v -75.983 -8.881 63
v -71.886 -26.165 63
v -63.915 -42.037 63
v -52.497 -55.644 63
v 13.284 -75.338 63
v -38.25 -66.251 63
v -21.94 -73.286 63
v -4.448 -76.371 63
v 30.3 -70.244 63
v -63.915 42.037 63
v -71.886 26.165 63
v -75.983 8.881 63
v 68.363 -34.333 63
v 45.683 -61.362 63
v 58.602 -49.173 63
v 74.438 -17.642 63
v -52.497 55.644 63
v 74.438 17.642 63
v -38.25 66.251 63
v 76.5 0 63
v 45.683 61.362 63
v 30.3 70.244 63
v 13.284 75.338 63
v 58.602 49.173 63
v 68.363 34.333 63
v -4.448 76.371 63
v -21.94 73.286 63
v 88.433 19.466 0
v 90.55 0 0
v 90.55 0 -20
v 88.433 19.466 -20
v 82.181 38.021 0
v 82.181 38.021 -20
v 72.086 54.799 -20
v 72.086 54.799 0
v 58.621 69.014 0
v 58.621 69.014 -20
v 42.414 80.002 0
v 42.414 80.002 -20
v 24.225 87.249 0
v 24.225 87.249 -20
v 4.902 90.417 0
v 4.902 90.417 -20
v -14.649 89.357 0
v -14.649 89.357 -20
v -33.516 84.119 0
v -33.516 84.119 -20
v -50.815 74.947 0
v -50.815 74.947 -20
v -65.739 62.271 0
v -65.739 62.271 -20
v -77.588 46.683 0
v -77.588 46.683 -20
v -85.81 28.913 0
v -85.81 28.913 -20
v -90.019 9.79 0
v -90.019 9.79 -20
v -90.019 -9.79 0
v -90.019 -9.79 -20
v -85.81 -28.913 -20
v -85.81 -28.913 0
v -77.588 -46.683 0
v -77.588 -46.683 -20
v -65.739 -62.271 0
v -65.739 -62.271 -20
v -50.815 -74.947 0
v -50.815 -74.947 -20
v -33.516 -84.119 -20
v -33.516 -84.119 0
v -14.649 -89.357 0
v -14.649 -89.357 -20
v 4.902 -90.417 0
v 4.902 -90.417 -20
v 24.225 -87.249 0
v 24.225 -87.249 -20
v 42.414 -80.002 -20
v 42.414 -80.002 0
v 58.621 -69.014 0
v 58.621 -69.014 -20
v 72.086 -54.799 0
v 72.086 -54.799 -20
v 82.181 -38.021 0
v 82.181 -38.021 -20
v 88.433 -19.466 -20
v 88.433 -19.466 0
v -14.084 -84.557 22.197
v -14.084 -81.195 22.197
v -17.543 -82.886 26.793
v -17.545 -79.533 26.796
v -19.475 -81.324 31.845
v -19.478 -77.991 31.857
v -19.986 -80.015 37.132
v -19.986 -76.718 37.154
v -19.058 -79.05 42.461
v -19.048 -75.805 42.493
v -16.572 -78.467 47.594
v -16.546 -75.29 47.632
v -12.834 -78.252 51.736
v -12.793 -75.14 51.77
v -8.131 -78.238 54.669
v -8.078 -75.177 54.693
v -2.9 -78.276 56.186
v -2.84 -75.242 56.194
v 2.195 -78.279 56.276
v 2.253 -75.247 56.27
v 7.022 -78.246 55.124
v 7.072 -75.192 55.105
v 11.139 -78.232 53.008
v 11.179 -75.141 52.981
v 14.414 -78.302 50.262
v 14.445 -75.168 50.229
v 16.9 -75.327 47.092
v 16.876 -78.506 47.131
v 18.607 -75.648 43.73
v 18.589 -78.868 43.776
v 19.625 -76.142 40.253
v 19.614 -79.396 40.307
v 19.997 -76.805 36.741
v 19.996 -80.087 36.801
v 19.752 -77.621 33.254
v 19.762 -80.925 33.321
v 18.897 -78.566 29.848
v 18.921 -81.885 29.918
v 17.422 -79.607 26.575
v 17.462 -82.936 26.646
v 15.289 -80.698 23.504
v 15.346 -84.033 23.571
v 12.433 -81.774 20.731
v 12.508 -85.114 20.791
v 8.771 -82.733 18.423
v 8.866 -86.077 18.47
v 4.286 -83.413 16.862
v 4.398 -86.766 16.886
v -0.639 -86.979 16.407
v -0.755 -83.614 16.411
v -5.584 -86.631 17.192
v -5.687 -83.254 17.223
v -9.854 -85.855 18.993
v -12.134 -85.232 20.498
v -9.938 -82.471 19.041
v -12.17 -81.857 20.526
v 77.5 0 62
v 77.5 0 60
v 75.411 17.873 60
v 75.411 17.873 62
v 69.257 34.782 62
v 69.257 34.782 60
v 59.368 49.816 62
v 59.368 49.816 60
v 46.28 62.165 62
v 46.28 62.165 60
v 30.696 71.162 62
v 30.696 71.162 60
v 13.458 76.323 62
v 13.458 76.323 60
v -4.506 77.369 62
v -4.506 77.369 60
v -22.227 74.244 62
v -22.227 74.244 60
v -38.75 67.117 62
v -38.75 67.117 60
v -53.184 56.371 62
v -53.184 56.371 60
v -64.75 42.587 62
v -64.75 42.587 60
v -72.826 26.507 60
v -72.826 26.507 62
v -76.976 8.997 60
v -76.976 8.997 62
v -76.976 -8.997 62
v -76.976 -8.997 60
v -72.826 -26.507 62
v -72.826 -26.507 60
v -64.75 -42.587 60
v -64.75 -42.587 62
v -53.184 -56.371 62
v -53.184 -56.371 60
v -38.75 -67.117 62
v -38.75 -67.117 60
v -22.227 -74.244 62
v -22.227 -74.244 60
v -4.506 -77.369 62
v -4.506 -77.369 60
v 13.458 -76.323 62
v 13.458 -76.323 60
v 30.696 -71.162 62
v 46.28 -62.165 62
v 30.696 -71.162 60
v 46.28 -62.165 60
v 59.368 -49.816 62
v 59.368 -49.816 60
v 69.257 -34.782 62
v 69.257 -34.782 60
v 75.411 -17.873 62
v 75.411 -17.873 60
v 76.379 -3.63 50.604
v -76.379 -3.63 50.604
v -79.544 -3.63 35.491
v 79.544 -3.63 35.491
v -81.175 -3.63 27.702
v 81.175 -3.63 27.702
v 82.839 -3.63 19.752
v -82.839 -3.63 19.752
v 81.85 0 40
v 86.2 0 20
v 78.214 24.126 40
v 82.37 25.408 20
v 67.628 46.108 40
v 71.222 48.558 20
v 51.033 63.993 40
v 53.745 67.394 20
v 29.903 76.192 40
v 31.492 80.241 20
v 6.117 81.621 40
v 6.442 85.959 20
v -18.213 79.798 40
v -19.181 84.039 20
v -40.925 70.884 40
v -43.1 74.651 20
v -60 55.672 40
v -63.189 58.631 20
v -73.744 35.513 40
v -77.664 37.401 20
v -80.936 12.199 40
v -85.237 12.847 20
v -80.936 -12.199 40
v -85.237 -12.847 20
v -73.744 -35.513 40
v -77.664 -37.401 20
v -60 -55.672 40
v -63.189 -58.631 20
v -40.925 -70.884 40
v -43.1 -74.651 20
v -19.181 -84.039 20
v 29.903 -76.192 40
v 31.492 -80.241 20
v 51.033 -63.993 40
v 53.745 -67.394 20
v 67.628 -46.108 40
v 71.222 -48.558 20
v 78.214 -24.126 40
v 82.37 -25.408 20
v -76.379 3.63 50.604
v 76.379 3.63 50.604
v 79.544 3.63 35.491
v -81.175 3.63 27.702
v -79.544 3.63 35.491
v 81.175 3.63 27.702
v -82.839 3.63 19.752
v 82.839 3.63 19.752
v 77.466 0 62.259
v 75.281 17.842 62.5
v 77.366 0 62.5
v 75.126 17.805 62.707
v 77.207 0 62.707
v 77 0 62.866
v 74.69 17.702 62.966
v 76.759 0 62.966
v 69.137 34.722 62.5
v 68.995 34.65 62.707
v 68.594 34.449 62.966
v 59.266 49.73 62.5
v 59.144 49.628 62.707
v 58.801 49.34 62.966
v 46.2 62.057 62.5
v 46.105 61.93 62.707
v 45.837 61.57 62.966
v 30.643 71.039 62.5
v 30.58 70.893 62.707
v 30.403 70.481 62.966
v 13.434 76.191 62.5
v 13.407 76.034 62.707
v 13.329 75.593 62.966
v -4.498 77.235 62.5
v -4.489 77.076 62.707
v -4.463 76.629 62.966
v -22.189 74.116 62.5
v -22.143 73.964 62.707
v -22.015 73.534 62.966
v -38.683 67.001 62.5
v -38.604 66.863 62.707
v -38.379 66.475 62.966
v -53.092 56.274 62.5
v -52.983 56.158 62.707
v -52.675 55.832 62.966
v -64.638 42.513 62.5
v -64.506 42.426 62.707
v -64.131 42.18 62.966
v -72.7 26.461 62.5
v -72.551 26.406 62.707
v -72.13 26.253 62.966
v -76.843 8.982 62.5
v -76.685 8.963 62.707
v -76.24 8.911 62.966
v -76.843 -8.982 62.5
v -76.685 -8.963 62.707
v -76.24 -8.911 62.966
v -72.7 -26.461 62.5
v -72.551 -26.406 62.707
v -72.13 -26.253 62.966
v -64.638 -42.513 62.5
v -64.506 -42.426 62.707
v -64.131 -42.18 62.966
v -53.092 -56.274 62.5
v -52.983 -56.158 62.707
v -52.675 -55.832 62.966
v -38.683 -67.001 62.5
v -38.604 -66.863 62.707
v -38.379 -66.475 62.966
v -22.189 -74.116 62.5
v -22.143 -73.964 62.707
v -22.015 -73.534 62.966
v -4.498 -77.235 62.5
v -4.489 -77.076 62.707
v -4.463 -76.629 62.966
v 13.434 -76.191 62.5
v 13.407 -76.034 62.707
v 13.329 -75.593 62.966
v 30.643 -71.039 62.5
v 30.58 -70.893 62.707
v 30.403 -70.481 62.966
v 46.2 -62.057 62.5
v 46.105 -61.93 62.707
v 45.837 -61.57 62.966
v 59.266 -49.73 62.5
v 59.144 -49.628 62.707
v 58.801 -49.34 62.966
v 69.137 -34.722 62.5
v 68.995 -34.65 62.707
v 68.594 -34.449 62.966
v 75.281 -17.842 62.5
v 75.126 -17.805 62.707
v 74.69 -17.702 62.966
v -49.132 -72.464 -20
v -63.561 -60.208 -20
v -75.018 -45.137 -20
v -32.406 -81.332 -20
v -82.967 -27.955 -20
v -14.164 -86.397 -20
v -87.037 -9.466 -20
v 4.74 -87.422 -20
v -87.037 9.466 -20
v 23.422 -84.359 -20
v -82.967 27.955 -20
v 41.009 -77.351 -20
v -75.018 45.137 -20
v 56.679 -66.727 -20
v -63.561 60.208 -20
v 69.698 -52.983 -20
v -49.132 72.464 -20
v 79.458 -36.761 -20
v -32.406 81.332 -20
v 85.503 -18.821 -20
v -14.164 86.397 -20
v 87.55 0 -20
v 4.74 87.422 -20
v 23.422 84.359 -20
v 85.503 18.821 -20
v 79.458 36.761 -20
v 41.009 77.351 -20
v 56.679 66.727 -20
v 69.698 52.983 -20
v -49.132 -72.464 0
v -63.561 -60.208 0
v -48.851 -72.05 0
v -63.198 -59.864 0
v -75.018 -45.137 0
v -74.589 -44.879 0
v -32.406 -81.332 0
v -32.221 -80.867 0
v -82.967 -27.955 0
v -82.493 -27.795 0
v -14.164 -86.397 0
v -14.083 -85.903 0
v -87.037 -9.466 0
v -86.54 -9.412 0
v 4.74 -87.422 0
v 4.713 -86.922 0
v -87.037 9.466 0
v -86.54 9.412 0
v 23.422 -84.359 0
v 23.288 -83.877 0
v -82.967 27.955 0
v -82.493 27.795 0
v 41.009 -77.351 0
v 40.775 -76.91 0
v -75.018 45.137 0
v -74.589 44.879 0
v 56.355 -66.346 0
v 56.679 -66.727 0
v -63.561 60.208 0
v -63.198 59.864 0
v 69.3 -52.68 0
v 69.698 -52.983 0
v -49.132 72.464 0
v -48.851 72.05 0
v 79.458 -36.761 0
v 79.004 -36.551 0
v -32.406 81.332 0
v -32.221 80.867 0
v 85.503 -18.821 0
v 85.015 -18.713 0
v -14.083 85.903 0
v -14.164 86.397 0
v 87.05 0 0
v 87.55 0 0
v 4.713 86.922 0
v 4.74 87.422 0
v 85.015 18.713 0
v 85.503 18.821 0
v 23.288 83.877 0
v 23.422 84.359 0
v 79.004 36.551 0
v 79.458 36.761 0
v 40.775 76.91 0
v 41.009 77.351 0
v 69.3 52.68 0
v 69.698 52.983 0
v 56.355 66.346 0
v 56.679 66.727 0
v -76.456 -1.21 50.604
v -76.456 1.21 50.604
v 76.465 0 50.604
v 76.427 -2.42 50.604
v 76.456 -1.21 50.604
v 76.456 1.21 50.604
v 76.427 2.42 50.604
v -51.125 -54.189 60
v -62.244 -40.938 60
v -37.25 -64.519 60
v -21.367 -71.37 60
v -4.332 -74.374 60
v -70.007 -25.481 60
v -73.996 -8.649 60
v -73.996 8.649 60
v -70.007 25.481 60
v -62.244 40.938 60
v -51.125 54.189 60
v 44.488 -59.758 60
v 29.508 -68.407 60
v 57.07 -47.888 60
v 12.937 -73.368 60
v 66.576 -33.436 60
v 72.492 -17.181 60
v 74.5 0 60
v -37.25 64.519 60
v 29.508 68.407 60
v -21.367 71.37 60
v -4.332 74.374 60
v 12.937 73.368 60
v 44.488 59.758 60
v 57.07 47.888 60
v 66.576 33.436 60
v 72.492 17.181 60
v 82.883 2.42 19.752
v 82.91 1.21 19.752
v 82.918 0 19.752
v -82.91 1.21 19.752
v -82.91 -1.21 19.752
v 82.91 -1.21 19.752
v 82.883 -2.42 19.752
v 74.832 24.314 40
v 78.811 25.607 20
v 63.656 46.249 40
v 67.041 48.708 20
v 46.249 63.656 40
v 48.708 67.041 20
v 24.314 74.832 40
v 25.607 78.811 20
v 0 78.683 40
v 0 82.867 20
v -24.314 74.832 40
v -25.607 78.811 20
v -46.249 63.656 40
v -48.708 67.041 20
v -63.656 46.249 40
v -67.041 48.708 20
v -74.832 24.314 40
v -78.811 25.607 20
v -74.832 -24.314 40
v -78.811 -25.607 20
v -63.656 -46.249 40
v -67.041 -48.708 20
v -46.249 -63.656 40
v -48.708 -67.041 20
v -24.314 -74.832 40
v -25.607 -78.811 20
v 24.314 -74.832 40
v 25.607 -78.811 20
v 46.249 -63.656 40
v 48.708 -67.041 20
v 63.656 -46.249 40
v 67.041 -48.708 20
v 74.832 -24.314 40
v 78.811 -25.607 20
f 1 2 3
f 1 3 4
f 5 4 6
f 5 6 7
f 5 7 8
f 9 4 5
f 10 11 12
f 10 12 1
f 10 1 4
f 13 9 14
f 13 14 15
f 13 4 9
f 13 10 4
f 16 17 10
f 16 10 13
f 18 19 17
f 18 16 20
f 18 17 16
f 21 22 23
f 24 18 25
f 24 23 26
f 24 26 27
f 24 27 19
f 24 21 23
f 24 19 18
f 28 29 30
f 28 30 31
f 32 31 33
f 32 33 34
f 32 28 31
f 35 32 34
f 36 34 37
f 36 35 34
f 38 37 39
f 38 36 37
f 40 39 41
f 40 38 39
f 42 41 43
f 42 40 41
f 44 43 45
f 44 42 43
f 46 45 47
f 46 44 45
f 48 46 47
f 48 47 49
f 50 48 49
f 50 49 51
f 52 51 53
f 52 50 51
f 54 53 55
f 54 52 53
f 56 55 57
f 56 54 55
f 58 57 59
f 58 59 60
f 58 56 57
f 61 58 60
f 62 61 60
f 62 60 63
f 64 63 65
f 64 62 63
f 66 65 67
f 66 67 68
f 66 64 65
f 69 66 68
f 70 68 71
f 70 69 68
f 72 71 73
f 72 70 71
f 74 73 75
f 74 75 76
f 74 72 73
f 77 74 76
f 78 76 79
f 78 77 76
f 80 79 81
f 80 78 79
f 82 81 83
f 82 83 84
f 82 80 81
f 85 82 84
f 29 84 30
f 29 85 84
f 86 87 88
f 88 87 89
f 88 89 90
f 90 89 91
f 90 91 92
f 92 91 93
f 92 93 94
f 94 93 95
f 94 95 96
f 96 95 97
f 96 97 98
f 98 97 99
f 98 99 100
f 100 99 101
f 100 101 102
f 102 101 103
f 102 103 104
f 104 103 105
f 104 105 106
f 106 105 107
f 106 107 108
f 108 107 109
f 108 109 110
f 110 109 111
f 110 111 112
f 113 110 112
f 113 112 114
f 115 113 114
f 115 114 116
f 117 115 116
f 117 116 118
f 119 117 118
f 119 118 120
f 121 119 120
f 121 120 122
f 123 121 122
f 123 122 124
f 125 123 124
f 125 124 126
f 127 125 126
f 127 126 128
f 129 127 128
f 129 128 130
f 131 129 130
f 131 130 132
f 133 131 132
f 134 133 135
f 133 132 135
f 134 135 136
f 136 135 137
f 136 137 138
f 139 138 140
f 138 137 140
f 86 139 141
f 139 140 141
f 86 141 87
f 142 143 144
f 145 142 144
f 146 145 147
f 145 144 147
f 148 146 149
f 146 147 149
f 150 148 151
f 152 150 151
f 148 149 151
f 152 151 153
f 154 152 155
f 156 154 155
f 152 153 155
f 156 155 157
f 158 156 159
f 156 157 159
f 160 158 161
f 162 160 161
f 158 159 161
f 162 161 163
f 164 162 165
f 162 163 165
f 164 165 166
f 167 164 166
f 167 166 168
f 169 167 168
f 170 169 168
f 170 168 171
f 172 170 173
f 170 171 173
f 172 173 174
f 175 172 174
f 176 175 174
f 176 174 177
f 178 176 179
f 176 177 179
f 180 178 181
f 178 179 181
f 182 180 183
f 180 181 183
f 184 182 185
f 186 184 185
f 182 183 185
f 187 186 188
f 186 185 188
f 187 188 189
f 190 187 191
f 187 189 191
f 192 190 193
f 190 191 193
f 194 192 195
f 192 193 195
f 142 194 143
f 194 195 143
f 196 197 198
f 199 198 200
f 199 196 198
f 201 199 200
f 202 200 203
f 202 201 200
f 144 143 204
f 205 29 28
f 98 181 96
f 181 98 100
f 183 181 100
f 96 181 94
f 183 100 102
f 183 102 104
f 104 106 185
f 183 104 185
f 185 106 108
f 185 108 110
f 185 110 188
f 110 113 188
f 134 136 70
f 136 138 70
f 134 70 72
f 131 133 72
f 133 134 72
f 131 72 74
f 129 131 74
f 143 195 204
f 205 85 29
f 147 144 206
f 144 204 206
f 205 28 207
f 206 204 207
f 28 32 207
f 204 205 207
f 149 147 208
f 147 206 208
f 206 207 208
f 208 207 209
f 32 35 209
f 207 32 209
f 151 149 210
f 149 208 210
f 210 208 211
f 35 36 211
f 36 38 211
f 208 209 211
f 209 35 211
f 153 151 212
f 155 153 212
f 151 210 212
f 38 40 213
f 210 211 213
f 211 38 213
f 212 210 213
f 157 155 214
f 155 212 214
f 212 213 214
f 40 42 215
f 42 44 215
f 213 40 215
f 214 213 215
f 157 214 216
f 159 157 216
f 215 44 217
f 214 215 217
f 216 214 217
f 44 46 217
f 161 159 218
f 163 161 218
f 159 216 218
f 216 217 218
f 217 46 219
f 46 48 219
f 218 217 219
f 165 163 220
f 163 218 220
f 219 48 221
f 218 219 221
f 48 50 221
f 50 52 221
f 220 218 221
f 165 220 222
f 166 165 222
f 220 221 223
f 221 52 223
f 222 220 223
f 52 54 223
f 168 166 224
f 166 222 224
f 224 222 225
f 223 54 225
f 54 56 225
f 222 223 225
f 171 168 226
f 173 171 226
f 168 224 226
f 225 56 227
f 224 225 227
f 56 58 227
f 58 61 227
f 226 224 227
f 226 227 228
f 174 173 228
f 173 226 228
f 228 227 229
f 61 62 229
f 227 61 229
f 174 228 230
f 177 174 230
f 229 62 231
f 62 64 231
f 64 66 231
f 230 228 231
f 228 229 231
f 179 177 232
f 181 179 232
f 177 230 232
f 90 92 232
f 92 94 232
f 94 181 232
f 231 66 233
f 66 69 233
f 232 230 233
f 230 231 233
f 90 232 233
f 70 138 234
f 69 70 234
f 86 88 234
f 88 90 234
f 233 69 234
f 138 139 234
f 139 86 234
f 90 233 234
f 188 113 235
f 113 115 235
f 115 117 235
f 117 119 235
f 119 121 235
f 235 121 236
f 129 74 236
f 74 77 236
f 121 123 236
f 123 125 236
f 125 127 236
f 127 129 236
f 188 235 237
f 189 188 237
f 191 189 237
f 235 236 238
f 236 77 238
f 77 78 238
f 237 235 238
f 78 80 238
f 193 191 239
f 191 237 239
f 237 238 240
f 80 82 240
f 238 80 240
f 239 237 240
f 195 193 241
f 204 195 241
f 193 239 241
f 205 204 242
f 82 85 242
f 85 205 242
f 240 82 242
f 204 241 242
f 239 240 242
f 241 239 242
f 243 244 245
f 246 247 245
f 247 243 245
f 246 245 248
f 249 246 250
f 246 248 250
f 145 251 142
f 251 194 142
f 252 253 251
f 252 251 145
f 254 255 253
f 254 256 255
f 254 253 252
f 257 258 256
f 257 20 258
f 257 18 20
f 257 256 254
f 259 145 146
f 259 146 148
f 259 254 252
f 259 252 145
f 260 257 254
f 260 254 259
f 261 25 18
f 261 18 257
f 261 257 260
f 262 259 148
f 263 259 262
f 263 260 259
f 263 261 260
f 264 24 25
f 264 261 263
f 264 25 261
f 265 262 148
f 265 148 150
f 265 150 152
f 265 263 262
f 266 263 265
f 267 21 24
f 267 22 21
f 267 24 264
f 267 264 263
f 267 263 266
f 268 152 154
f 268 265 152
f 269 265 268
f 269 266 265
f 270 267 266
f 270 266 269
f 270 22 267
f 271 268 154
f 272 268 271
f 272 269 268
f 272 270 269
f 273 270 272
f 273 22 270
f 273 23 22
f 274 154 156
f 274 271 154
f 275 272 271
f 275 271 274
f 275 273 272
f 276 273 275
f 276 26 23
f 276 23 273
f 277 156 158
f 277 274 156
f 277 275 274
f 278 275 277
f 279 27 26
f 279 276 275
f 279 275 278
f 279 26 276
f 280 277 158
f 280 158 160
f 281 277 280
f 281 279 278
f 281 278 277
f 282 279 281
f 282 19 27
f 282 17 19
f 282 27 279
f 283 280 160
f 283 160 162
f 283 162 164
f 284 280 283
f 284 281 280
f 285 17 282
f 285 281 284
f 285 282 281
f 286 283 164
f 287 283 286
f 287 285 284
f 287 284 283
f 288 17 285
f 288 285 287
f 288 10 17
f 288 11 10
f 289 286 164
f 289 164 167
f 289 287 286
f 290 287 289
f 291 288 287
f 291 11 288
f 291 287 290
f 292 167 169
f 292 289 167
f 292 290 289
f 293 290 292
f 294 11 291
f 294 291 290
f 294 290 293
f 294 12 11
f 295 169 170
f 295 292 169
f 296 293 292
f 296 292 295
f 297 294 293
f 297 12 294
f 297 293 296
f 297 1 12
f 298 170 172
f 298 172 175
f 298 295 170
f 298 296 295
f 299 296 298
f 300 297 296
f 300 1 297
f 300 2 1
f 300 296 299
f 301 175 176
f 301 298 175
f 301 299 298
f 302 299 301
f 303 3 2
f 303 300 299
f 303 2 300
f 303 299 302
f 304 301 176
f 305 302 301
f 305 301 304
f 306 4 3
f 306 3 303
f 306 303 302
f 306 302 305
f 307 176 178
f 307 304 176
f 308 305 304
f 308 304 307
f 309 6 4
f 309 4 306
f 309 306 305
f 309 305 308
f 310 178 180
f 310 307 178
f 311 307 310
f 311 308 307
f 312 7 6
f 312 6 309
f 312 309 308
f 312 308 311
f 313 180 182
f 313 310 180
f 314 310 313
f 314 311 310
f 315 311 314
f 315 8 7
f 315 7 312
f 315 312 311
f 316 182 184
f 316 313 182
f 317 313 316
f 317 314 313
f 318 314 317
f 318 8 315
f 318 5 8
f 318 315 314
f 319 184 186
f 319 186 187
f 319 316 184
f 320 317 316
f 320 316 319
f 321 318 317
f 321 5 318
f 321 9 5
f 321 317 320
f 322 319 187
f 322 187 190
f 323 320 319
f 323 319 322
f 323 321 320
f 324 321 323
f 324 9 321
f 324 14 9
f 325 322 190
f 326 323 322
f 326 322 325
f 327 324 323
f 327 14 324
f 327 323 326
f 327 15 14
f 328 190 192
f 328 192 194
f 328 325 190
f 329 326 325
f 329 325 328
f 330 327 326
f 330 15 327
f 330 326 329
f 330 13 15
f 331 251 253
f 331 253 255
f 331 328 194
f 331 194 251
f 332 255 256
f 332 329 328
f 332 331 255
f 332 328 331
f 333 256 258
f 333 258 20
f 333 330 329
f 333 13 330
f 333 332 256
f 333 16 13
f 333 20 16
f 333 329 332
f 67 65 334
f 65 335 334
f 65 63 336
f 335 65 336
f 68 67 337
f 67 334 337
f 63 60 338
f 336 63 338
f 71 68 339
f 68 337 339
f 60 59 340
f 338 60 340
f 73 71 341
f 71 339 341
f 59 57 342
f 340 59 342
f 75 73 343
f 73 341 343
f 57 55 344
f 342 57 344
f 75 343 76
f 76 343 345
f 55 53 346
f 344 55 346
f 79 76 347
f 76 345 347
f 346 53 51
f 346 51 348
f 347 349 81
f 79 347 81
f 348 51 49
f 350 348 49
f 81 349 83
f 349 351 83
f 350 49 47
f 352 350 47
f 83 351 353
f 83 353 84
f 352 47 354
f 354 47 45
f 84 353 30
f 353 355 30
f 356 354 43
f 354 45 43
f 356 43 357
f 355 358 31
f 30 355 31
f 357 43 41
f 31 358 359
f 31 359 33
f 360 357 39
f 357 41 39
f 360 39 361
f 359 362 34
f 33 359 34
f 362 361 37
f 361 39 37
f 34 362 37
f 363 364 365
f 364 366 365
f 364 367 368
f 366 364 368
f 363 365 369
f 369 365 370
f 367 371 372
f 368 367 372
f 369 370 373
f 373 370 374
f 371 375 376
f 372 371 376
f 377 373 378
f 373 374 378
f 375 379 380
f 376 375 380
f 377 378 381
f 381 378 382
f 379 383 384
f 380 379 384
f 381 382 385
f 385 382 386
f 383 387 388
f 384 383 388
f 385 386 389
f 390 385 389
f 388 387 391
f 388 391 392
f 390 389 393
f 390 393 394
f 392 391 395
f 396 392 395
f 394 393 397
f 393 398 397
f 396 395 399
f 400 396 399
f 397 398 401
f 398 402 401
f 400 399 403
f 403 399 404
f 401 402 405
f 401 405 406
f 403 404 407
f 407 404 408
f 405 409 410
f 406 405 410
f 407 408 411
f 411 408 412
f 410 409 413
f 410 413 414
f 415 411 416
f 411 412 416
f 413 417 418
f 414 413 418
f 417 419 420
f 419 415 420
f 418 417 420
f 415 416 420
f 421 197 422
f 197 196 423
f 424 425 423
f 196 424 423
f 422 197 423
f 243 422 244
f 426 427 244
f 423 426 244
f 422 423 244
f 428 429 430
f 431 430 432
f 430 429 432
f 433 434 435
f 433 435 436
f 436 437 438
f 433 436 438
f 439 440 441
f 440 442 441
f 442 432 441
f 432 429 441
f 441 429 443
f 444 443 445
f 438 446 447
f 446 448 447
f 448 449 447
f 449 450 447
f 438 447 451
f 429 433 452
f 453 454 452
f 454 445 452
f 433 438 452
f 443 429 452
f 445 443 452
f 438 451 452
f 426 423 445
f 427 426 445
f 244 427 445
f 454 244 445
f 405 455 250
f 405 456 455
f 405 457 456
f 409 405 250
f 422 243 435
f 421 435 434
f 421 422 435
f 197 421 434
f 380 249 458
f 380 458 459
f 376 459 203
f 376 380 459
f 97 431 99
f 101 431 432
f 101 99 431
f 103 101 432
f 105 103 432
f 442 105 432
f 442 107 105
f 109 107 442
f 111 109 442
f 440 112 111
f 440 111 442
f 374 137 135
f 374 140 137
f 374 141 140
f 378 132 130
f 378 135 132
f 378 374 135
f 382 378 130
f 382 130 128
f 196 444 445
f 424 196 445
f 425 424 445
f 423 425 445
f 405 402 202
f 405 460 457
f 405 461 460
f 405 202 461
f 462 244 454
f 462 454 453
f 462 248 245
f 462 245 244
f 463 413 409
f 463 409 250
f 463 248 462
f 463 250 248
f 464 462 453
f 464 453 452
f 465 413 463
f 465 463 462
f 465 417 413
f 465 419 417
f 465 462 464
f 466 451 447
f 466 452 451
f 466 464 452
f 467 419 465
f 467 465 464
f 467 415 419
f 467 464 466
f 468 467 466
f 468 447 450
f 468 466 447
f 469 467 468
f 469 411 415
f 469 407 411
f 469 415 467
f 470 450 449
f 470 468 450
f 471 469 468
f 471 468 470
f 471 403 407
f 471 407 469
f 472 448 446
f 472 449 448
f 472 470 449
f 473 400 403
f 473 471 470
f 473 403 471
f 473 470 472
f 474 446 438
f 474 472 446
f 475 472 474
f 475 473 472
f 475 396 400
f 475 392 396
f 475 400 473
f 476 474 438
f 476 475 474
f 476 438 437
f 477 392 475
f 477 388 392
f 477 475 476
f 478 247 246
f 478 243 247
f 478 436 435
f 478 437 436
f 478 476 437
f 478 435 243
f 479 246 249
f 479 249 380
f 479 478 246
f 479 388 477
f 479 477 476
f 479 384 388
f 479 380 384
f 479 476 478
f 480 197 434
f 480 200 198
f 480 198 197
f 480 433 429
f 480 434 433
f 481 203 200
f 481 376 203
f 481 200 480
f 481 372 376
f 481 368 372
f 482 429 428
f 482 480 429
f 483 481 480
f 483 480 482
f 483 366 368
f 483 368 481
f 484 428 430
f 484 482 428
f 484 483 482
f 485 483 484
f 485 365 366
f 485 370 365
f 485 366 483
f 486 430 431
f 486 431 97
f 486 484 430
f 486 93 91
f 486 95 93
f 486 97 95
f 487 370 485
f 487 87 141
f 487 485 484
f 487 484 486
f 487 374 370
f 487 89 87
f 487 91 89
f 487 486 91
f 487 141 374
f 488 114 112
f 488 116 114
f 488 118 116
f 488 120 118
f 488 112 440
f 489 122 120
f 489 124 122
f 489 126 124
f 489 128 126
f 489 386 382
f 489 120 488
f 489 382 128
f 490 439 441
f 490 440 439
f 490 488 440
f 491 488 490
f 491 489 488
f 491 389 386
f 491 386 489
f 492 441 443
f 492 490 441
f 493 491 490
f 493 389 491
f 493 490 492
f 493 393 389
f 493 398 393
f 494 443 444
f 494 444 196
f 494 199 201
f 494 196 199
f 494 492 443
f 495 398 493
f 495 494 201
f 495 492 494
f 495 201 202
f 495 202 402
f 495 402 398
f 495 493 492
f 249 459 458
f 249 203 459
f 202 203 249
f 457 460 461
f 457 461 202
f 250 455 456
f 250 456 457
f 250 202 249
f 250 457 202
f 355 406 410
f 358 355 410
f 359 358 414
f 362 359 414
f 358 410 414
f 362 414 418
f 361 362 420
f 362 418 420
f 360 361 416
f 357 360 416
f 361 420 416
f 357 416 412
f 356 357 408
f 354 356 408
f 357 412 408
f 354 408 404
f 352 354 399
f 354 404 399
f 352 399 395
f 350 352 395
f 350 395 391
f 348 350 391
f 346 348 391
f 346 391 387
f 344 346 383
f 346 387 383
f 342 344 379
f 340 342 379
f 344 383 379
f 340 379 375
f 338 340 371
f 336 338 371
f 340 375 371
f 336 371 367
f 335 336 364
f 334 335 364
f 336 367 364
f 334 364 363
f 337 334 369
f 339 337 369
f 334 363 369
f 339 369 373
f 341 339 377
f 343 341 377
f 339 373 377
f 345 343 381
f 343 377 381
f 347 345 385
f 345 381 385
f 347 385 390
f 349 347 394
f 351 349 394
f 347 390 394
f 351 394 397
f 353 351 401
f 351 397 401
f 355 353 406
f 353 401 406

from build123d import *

# Parameters (mm, degrees)
SKETCH2_R                       = 77.5
SKETCH1_R                       = 90.55
SKETCH4_R                       = 74.5
SKETCH3_R                       = 87.05
SKETCH5_R                       = 77.5
BOSS_EXTRUDE1_DEPTH             = 3
SKETCH7_R                       = 20
CUT_EXTRUDE1_DEPTH              = 159
BOSS_EXTRUDE4_REACH             = 144.715
SKETCH9_W                       = 30.851346151
SKETCH9_H                       = 7.25914027
BOSS_EXTRUDE4_DIRECTION_2_REACH = 144.715
FILLET2_R                       = 1
SKETCH1_7_R                     = 90.55
SKETCH1_7_R_2                   = 87.55
BOSS_EXTRUDE6_DEPTH             = 20


with BuildPart() as part:
    # Sketch2 → Loft2 section 0
    with BuildSketch(Plane.XY.offset(60)):
        Circle(SKETCH2_R)
    # Sketch1 → Loft2 section 1
    with BuildSketch(Plane.XY):
        Circle(SKETCH1_R)
    loft()

    # Sketch4 → Cut-Loft1 section 0
    with BuildSketch(Plane.XY.offset(60)):
        Circle(SKETCH4_R)
    # Sketch3 → Cut-Loft1 section 1
    with BuildSketch(Plane(origin=(0, 0, 0), x_dir=(-1, 0, 0), z_dir=(0, 0, -1))):
        Circle(SKETCH3_R)
    loft(mode=Mode.SUBTRACT)

    # Sketch5 → Boss-Extrude1 (add)
    with BuildSketch(Plane.XY.offset(60)):
        Circle(SKETCH5_R)
    extrude(amount=BOSS_EXTRUDE1_DEPTH)

    # Sketch7 → Cut-Extrude1 (cut)
    with BuildSketch(Plane(origin=(0, 0, 0), x_dir=(1, 0, 0), z_dir=(0, 1, 0))):
        with Locations((0, -36.396883827)):
            Circle(SKETCH7_R)
    extrude(amount=-CUT_EXTRUDE1_DEPTH, mode=Mode.SUBTRACT)

    # Boss-Extrude4: up to this cone (the profile starts inside it)
    boss_extrude4_end = Plane(origin=(0, 0, 35.178058), z_dir=(0, 0, -1)) * Cone(32.648891502, 126.734954235, 449.813845737, mode=Mode.PRIVATE)
    # Sketch9 → Boss-Extrude4 (add, up to the surface)
    with BuildSketch(Plane(origin=(0, 0, 0), x_dir=(0, 0, -1), z_dir=(1, 0, 0)), mode=Mode.PRIVATE) as boss_extrude4_sk1:
        with Locations((-35.178058342, 0)):
            Rectangle(SKETCH9_W, SKETCH9_H)
    boss_extrude4_tool1 = extrude(boss_extrude4_sk1.sketch, amount=BOSS_EXTRUDE4_REACH, mode=Mode.PRIVATE) & boss_extrude4_end
    add(boss_extrude4_tool1.solids().sort_by_distance((0, 0, 35.178058))[0])

    # Boss-Extrude4 direction 2: up to this cone (the profile starts inside it)
    boss_extrude4_direction_2_end = Plane(origin=(0, 0, 35.178058), z_dir=(0, 0, -1)) * Cone(32.648891502, 126.734954235, 449.813845737, mode=Mode.PRIVATE)
    # Sketch9 → Boss-Extrude4 direction 2 (add, up to the surface)
    with BuildSketch(Plane(origin=(0, 0, 0), x_dir=(0, 0, -1), z_dir=(1, 0, 0)), mode=Mode.PRIVATE) as boss_extrude4_direction_2_sk1:
        with Locations((-35.178058342, 0)):
            Rectangle(SKETCH9_W, SKETCH9_H)
    boss_extrude4_direction_2_tool1 = extrude(boss_extrude4_direction_2_sk1.sketch, amount=-BOSS_EXTRUDE4_DIRECTION_2_REACH, mode=Mode.PRIVATE) & boss_extrude4_direction_2_end
    add(boss_extrude4_direction_2_tool1.solids().sort_by_distance((0, 0, 35.178058))[0])

    # Fillet2
    fillet2_edges = [part.edges().sort_by_distance(p)[0] for p in [
        (-77.5, 0, 63),
    ]]
    fillet(fillet2_edges, radius=FILLET2_R)

    # Sketch1<7> → Boss-Extrude6 (add)
    with BuildSketch(Plane.XY):
        Circle(SKETCH1_7_R)
        Circle(SKETCH1_7_R_2, mode=Mode.SUBTRACT)
    extrude(amount=-BOSS_EXTRUDE6_DEPTH)


solid = part.part
